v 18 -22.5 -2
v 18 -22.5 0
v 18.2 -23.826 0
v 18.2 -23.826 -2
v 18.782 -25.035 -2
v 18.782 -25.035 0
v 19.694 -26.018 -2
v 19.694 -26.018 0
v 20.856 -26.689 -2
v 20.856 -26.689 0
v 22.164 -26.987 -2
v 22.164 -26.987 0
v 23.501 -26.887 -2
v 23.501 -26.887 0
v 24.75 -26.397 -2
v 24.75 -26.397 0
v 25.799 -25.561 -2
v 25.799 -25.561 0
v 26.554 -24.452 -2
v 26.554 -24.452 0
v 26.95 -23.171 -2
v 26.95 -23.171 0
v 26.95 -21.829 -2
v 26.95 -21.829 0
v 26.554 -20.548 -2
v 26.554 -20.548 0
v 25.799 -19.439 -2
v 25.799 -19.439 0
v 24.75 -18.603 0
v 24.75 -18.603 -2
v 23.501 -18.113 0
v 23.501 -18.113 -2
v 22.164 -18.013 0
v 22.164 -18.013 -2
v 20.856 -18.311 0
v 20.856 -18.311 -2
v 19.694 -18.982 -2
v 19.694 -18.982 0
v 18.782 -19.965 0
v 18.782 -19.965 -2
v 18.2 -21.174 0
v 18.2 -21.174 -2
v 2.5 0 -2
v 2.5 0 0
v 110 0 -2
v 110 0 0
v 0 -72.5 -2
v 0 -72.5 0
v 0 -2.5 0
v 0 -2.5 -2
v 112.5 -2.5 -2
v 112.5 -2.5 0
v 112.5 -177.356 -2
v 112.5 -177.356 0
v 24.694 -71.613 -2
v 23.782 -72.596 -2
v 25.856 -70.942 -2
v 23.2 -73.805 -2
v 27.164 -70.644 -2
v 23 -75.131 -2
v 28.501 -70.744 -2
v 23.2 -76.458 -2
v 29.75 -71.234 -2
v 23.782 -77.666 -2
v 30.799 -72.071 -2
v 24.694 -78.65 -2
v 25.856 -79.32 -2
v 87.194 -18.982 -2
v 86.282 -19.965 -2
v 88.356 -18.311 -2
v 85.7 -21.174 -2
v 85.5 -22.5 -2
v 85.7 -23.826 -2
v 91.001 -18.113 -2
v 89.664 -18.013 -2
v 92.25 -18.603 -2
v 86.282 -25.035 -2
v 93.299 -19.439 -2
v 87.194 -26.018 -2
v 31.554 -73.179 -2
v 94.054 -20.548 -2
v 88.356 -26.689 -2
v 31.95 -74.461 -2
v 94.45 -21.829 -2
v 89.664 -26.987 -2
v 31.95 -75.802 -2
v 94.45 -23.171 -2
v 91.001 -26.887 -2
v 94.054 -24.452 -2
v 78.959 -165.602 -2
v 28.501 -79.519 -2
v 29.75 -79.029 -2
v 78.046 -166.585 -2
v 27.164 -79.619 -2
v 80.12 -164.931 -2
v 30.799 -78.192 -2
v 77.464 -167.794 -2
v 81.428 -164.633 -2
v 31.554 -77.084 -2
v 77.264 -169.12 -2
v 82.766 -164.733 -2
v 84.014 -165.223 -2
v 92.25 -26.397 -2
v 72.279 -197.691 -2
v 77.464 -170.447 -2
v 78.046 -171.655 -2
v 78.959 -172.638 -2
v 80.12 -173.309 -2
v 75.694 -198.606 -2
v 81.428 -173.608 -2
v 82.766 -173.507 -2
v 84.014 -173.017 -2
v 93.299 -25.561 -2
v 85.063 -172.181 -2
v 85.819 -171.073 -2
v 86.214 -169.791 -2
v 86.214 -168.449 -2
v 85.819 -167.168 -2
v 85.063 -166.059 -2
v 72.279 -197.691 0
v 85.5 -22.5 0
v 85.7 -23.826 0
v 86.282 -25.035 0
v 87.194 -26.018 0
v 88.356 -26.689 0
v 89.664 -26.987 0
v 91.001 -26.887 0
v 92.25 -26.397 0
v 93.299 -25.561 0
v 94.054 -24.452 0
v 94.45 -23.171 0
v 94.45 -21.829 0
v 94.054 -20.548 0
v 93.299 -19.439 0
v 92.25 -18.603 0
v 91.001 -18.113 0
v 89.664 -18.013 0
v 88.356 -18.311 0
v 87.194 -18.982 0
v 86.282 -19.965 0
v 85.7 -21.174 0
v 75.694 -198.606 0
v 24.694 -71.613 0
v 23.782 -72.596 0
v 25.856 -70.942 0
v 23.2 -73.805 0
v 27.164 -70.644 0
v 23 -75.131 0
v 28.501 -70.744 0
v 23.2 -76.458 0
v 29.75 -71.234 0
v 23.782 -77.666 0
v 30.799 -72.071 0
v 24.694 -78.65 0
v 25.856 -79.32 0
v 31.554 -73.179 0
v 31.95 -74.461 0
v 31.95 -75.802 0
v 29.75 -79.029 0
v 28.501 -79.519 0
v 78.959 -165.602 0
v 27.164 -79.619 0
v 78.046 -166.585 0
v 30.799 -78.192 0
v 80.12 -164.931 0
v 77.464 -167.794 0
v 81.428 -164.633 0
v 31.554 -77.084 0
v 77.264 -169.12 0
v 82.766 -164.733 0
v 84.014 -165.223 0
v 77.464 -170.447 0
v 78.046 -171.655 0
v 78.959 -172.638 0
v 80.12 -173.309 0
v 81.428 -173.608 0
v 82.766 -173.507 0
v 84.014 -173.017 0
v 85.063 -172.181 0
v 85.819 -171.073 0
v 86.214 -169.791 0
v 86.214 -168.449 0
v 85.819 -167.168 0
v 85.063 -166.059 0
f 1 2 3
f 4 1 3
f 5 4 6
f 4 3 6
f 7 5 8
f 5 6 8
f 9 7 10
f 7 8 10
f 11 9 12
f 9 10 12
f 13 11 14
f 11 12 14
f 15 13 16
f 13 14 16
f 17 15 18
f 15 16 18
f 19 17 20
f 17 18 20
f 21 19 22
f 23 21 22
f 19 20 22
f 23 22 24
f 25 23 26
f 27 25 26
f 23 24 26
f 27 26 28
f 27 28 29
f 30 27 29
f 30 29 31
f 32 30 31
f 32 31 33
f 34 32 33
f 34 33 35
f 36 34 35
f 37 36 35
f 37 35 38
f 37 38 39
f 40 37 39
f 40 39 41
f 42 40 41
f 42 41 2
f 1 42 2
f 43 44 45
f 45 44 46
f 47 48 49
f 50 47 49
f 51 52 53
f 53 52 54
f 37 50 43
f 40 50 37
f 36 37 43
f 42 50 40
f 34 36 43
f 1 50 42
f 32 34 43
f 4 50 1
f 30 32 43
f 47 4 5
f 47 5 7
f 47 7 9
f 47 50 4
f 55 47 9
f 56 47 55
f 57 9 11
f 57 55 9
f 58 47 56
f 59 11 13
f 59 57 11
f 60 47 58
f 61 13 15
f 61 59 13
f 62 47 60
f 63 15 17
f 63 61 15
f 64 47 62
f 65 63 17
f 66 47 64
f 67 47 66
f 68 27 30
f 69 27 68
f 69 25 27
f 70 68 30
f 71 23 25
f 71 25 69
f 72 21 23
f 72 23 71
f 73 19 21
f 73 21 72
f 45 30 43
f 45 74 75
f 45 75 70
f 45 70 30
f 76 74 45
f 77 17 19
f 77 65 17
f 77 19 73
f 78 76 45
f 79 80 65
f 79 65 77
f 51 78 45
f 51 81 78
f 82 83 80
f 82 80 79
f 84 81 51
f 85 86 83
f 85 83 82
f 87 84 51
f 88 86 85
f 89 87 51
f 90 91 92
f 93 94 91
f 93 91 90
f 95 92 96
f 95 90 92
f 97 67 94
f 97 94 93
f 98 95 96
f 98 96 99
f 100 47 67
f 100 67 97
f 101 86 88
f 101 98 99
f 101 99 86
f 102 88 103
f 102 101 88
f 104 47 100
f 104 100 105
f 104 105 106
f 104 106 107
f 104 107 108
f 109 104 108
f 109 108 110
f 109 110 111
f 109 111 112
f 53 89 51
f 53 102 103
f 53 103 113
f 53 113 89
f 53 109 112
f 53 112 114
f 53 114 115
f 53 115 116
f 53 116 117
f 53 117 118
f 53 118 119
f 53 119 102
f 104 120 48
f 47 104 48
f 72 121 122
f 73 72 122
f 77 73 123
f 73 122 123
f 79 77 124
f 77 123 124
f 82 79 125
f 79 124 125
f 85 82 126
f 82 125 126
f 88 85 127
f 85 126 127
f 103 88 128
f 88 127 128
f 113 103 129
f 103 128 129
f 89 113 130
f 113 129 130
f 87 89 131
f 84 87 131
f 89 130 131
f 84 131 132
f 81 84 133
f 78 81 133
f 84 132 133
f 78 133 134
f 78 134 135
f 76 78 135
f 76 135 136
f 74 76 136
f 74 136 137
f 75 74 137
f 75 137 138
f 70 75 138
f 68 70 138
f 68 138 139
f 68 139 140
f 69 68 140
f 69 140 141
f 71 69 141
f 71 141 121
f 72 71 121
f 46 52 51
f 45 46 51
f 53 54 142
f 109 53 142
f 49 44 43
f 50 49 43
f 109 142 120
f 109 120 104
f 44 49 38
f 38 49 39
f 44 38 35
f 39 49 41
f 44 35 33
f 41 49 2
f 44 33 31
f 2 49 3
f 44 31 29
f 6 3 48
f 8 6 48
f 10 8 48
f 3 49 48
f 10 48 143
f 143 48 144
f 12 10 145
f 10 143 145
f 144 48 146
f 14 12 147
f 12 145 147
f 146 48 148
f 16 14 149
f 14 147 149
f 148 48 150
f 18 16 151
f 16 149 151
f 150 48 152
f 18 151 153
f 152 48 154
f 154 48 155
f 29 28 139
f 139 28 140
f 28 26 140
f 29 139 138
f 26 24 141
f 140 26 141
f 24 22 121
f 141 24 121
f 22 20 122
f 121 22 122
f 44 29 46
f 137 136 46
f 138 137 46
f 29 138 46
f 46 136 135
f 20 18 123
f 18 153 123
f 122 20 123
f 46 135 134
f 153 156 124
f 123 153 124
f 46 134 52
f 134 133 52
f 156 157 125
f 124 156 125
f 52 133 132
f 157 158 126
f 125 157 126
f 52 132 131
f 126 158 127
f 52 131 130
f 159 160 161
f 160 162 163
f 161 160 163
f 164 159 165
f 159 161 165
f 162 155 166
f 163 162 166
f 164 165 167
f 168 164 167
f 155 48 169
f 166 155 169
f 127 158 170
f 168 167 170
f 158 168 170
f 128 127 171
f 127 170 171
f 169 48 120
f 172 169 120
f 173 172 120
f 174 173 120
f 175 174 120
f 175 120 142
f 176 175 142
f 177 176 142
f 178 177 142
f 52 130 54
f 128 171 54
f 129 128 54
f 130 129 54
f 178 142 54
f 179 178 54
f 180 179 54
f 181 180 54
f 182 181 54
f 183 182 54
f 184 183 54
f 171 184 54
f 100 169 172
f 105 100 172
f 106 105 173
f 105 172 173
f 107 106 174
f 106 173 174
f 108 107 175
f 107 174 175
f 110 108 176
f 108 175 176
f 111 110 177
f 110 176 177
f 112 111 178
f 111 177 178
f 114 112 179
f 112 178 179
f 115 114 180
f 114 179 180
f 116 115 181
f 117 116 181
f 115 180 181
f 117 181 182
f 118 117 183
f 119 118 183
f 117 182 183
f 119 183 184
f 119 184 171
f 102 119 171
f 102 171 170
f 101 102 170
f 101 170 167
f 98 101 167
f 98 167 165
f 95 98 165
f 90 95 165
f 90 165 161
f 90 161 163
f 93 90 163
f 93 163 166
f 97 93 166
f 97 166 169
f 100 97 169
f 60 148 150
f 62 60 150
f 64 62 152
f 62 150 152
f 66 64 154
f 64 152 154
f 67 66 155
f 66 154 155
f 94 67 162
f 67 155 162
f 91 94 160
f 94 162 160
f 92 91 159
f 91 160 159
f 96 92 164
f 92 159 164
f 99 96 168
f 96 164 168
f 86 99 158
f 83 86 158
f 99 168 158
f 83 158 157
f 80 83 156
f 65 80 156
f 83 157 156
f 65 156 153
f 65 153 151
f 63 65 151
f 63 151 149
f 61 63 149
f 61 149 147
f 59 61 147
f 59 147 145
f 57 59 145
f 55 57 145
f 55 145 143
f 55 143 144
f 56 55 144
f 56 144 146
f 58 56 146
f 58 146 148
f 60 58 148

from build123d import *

# Parameters (mm, degrees)
EXTRUDE_1_DEPTH   = 2
HOLE_WIZARD_M81_D = 9
CHAMFER_1_SIZE    = 2.5


with BuildPart() as part:
    # Эскиз3 → Бобышка-Вытянуть1 (new body)
    with BuildSketch(Plane(origin=(0, 0, 0), x_dir=(1, 0, 0), z_dir=(0, 0, -1))):
        Polygon((0, 0), (112.5, 0), (112.5, 177.355715852), (73.52885683, 199.855715851), (0, 72.5), align=None)
    extrude(amount=EXTRUDE_1_DEPTH)

    # Отверстие с зазором M81 (through all)
    with Locations(Plane(origin=(0, 0, -2), x_dir=(1, 0, 0), z_dir=(0, 0, -1))):
        with Locations((22.5, 22.5), (90, 22.5), (27.5, 75.131397208), (81.764428415, 169.120144266)):
            Hole(HOLE_WIZARD_M81_D / 2)

    # Фаска1
    chamfer_1_edges = [part.edges().sort_by_distance(p)[0] for p in [
        (73.52885683, -199.855715851, -1),
        (112.5, 0, -1),
        (0, 0, -1),
    ]]
    chamfer(chamfer_1_edges, length=CHAMFER_1_SIZE)


solid = part.part
